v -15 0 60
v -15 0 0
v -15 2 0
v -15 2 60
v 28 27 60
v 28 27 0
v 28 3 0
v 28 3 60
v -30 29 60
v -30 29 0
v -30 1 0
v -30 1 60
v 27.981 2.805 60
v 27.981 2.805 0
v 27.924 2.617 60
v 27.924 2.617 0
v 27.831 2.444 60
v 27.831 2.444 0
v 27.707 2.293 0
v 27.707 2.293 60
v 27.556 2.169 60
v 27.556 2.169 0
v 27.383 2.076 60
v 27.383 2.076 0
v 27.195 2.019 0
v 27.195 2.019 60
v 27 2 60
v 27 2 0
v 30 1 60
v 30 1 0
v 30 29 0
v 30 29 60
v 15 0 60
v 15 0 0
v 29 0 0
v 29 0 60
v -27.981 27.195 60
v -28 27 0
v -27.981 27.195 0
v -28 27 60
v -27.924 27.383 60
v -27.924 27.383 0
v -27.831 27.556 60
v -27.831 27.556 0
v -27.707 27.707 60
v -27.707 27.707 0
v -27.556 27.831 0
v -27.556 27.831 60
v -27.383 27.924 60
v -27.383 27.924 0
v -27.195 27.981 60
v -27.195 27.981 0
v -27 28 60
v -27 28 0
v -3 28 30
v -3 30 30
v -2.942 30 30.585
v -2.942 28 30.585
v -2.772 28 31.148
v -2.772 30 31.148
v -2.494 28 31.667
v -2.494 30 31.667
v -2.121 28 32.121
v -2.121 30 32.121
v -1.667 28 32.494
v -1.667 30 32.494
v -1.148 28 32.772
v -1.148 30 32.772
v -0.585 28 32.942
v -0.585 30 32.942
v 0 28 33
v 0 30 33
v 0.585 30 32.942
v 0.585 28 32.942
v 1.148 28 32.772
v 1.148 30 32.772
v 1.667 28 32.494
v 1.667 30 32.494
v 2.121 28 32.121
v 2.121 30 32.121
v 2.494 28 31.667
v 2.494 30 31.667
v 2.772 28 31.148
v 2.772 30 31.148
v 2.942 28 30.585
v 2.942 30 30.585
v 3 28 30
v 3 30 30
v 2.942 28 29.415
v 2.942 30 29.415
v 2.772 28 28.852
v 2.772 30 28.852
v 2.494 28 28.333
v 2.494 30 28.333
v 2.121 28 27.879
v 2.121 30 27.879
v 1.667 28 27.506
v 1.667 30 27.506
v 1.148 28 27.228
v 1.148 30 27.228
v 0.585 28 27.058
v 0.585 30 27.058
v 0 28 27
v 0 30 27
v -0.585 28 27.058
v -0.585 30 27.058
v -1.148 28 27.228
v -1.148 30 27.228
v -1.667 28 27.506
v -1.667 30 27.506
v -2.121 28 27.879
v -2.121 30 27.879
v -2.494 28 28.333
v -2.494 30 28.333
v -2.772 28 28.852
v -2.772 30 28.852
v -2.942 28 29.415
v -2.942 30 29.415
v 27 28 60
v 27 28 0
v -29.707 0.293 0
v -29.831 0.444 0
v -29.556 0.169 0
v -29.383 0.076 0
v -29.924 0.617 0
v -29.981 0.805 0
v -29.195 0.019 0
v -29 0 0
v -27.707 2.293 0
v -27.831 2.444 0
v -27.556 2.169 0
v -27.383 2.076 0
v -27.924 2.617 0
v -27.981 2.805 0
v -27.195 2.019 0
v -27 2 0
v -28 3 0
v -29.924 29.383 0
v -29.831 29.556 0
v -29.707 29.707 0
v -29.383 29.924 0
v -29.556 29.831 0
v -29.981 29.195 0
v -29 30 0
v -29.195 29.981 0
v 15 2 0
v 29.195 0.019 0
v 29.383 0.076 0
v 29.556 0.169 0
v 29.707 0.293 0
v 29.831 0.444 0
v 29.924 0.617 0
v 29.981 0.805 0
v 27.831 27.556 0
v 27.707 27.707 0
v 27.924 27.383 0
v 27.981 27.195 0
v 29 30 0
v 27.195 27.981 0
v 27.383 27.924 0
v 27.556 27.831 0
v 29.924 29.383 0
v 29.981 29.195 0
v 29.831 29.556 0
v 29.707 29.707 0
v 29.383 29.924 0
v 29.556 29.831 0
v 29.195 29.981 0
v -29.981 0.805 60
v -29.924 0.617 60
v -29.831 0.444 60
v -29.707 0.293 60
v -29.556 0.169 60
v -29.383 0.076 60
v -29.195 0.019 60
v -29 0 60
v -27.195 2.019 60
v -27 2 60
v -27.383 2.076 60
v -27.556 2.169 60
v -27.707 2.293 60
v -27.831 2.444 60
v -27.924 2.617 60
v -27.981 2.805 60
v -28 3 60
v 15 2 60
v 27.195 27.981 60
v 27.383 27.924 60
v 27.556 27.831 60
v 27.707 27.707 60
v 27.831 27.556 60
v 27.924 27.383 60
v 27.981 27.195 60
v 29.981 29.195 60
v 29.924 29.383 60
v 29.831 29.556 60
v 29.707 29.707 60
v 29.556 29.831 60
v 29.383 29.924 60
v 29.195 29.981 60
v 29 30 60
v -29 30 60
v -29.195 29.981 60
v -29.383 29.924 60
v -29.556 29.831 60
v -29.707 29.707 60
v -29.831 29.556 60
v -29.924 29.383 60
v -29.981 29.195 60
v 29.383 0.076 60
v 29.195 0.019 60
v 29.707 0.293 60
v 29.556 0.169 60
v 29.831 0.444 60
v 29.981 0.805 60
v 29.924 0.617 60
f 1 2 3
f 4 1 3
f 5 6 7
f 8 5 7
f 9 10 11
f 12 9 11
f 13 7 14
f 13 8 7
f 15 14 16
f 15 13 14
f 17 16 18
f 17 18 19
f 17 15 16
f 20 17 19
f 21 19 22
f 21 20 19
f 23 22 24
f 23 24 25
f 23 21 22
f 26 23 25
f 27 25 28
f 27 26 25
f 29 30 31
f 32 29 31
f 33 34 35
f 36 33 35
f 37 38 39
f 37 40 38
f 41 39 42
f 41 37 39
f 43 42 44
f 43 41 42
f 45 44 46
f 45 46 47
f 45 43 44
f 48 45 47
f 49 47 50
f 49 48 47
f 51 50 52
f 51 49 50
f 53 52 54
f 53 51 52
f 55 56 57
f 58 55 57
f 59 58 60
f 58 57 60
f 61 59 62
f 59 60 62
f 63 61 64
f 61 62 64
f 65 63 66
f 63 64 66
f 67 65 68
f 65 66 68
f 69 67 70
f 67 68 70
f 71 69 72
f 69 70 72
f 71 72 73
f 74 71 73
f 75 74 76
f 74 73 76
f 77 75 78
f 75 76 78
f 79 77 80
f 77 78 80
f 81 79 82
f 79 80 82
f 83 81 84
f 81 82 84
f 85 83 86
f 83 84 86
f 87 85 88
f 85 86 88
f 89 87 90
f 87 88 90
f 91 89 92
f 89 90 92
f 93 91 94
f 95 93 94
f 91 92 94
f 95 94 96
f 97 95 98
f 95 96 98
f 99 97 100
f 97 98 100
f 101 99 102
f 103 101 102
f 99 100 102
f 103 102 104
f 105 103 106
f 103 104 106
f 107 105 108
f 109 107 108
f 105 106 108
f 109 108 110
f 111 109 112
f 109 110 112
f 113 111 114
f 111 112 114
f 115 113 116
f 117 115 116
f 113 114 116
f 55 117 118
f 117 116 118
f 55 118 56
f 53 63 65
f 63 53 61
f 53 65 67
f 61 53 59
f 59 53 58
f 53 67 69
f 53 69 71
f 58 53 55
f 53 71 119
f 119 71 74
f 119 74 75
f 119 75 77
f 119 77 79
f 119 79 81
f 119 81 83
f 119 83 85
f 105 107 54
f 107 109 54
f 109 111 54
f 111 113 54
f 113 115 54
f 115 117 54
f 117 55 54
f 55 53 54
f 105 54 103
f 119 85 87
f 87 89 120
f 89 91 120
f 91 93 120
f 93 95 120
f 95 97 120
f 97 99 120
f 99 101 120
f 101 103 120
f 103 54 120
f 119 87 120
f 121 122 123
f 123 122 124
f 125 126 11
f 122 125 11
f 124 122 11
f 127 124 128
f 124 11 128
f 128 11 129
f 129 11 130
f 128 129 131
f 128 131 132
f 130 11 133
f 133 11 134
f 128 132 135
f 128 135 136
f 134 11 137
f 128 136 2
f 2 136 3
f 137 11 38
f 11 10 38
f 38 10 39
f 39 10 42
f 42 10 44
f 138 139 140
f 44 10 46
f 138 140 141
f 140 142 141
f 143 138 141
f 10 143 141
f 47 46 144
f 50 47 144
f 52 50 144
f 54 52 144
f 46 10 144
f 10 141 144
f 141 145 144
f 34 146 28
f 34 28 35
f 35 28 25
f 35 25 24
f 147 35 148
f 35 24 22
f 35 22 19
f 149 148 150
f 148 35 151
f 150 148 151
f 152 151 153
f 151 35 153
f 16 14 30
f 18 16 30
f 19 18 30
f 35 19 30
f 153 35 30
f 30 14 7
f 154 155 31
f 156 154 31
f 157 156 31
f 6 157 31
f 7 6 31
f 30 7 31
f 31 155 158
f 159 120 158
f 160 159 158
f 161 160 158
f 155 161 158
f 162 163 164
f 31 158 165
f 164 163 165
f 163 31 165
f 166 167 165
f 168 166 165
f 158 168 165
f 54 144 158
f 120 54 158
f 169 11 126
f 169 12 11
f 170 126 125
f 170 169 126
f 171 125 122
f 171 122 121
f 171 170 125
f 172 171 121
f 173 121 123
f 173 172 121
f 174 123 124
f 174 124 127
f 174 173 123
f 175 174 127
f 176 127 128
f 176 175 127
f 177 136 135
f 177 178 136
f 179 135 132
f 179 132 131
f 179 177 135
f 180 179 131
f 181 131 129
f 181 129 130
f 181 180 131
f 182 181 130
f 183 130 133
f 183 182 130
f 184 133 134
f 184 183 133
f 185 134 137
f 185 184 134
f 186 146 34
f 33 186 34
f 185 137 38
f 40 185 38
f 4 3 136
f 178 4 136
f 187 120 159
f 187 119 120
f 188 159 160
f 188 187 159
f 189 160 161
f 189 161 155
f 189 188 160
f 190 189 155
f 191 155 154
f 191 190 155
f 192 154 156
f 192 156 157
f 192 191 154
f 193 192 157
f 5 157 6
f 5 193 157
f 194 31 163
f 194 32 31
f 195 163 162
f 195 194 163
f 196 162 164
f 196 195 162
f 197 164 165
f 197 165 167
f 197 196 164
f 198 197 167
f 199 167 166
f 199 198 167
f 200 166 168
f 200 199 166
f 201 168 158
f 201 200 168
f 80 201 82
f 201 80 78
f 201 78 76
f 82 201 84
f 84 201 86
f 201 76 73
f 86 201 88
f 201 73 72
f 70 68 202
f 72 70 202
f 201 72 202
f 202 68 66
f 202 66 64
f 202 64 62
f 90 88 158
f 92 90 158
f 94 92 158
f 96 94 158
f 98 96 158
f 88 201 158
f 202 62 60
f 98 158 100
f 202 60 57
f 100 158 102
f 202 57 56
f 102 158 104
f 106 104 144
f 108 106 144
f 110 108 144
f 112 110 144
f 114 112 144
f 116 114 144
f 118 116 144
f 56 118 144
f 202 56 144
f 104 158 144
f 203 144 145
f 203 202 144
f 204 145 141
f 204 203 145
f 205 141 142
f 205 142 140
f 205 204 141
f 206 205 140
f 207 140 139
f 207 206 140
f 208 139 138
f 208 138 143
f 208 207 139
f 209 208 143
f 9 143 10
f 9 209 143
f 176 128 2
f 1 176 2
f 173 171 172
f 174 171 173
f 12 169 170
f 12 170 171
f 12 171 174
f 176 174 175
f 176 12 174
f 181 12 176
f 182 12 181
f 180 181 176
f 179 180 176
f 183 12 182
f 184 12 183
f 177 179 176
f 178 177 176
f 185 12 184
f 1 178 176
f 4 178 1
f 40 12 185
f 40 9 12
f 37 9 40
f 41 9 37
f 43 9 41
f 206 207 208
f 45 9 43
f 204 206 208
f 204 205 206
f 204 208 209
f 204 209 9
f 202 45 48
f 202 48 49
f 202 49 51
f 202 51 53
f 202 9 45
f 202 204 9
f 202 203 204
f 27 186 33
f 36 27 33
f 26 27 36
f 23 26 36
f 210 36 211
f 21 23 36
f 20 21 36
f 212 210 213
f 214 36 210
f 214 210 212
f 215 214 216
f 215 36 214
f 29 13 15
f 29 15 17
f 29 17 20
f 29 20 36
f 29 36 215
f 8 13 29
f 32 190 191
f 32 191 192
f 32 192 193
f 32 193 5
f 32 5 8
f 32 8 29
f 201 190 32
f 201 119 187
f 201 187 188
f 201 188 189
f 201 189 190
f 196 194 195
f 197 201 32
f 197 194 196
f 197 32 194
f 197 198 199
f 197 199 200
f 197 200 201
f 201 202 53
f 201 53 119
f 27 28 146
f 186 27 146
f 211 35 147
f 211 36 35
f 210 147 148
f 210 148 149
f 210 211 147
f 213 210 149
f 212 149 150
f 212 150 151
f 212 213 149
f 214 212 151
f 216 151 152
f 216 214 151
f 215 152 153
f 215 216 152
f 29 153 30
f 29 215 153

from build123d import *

# Parameters (mm, degrees)
BOSS_EXTRUDE1_DEPTH = 60
FILLET1_R           = 1
SKETCH2_R           = 3
CUT_EXTRUDE1_DEPTH  = 2


with BuildPart() as part:
    # Sketch1 → Boss-Extrude1 (new body)
    with BuildSketch(Plane.XY):
        Polygon((-15, 0), (-15, 2), (-28, 2), (-28, 28), (28, 28), (28, 2), (15, 2), (15, 0), (30, 0), (30, 30), (-30, 30), (-30, 0), align=None)
    extrude(amount=BOSS_EXTRUDE1_DEPTH)

    # Fillet1
    fillet1_edges = [part.edges().sort_by_distance(p)[0] for p in [
        (28, 2, 30),
        (28, 28, 30),
        (-28, 28, 30),
        (-28, 2, 30),
        (-30, 0, 30),
        (-30, 30, 30),
        (30, 30, 30),
        (30, 0, 30),
    ]]
    fillet(fillet1_edges, radius=FILLET1_R)

    # Sketch2 → Cut-Extrude1 (cut)
    with BuildSketch(Plane(origin=(0, 30, 0), x_dir=(1, 0, 0), z_dir=(0, 1, 0))):
        with Locations(Location((0, -30, 0), (0, 0, 180))):
            Circle(SKETCH2_R)
    extrude(amount=-CUT_EXTRUDE1_DEPTH, mode=Mode.SUBTRACT)


solid = part.part
